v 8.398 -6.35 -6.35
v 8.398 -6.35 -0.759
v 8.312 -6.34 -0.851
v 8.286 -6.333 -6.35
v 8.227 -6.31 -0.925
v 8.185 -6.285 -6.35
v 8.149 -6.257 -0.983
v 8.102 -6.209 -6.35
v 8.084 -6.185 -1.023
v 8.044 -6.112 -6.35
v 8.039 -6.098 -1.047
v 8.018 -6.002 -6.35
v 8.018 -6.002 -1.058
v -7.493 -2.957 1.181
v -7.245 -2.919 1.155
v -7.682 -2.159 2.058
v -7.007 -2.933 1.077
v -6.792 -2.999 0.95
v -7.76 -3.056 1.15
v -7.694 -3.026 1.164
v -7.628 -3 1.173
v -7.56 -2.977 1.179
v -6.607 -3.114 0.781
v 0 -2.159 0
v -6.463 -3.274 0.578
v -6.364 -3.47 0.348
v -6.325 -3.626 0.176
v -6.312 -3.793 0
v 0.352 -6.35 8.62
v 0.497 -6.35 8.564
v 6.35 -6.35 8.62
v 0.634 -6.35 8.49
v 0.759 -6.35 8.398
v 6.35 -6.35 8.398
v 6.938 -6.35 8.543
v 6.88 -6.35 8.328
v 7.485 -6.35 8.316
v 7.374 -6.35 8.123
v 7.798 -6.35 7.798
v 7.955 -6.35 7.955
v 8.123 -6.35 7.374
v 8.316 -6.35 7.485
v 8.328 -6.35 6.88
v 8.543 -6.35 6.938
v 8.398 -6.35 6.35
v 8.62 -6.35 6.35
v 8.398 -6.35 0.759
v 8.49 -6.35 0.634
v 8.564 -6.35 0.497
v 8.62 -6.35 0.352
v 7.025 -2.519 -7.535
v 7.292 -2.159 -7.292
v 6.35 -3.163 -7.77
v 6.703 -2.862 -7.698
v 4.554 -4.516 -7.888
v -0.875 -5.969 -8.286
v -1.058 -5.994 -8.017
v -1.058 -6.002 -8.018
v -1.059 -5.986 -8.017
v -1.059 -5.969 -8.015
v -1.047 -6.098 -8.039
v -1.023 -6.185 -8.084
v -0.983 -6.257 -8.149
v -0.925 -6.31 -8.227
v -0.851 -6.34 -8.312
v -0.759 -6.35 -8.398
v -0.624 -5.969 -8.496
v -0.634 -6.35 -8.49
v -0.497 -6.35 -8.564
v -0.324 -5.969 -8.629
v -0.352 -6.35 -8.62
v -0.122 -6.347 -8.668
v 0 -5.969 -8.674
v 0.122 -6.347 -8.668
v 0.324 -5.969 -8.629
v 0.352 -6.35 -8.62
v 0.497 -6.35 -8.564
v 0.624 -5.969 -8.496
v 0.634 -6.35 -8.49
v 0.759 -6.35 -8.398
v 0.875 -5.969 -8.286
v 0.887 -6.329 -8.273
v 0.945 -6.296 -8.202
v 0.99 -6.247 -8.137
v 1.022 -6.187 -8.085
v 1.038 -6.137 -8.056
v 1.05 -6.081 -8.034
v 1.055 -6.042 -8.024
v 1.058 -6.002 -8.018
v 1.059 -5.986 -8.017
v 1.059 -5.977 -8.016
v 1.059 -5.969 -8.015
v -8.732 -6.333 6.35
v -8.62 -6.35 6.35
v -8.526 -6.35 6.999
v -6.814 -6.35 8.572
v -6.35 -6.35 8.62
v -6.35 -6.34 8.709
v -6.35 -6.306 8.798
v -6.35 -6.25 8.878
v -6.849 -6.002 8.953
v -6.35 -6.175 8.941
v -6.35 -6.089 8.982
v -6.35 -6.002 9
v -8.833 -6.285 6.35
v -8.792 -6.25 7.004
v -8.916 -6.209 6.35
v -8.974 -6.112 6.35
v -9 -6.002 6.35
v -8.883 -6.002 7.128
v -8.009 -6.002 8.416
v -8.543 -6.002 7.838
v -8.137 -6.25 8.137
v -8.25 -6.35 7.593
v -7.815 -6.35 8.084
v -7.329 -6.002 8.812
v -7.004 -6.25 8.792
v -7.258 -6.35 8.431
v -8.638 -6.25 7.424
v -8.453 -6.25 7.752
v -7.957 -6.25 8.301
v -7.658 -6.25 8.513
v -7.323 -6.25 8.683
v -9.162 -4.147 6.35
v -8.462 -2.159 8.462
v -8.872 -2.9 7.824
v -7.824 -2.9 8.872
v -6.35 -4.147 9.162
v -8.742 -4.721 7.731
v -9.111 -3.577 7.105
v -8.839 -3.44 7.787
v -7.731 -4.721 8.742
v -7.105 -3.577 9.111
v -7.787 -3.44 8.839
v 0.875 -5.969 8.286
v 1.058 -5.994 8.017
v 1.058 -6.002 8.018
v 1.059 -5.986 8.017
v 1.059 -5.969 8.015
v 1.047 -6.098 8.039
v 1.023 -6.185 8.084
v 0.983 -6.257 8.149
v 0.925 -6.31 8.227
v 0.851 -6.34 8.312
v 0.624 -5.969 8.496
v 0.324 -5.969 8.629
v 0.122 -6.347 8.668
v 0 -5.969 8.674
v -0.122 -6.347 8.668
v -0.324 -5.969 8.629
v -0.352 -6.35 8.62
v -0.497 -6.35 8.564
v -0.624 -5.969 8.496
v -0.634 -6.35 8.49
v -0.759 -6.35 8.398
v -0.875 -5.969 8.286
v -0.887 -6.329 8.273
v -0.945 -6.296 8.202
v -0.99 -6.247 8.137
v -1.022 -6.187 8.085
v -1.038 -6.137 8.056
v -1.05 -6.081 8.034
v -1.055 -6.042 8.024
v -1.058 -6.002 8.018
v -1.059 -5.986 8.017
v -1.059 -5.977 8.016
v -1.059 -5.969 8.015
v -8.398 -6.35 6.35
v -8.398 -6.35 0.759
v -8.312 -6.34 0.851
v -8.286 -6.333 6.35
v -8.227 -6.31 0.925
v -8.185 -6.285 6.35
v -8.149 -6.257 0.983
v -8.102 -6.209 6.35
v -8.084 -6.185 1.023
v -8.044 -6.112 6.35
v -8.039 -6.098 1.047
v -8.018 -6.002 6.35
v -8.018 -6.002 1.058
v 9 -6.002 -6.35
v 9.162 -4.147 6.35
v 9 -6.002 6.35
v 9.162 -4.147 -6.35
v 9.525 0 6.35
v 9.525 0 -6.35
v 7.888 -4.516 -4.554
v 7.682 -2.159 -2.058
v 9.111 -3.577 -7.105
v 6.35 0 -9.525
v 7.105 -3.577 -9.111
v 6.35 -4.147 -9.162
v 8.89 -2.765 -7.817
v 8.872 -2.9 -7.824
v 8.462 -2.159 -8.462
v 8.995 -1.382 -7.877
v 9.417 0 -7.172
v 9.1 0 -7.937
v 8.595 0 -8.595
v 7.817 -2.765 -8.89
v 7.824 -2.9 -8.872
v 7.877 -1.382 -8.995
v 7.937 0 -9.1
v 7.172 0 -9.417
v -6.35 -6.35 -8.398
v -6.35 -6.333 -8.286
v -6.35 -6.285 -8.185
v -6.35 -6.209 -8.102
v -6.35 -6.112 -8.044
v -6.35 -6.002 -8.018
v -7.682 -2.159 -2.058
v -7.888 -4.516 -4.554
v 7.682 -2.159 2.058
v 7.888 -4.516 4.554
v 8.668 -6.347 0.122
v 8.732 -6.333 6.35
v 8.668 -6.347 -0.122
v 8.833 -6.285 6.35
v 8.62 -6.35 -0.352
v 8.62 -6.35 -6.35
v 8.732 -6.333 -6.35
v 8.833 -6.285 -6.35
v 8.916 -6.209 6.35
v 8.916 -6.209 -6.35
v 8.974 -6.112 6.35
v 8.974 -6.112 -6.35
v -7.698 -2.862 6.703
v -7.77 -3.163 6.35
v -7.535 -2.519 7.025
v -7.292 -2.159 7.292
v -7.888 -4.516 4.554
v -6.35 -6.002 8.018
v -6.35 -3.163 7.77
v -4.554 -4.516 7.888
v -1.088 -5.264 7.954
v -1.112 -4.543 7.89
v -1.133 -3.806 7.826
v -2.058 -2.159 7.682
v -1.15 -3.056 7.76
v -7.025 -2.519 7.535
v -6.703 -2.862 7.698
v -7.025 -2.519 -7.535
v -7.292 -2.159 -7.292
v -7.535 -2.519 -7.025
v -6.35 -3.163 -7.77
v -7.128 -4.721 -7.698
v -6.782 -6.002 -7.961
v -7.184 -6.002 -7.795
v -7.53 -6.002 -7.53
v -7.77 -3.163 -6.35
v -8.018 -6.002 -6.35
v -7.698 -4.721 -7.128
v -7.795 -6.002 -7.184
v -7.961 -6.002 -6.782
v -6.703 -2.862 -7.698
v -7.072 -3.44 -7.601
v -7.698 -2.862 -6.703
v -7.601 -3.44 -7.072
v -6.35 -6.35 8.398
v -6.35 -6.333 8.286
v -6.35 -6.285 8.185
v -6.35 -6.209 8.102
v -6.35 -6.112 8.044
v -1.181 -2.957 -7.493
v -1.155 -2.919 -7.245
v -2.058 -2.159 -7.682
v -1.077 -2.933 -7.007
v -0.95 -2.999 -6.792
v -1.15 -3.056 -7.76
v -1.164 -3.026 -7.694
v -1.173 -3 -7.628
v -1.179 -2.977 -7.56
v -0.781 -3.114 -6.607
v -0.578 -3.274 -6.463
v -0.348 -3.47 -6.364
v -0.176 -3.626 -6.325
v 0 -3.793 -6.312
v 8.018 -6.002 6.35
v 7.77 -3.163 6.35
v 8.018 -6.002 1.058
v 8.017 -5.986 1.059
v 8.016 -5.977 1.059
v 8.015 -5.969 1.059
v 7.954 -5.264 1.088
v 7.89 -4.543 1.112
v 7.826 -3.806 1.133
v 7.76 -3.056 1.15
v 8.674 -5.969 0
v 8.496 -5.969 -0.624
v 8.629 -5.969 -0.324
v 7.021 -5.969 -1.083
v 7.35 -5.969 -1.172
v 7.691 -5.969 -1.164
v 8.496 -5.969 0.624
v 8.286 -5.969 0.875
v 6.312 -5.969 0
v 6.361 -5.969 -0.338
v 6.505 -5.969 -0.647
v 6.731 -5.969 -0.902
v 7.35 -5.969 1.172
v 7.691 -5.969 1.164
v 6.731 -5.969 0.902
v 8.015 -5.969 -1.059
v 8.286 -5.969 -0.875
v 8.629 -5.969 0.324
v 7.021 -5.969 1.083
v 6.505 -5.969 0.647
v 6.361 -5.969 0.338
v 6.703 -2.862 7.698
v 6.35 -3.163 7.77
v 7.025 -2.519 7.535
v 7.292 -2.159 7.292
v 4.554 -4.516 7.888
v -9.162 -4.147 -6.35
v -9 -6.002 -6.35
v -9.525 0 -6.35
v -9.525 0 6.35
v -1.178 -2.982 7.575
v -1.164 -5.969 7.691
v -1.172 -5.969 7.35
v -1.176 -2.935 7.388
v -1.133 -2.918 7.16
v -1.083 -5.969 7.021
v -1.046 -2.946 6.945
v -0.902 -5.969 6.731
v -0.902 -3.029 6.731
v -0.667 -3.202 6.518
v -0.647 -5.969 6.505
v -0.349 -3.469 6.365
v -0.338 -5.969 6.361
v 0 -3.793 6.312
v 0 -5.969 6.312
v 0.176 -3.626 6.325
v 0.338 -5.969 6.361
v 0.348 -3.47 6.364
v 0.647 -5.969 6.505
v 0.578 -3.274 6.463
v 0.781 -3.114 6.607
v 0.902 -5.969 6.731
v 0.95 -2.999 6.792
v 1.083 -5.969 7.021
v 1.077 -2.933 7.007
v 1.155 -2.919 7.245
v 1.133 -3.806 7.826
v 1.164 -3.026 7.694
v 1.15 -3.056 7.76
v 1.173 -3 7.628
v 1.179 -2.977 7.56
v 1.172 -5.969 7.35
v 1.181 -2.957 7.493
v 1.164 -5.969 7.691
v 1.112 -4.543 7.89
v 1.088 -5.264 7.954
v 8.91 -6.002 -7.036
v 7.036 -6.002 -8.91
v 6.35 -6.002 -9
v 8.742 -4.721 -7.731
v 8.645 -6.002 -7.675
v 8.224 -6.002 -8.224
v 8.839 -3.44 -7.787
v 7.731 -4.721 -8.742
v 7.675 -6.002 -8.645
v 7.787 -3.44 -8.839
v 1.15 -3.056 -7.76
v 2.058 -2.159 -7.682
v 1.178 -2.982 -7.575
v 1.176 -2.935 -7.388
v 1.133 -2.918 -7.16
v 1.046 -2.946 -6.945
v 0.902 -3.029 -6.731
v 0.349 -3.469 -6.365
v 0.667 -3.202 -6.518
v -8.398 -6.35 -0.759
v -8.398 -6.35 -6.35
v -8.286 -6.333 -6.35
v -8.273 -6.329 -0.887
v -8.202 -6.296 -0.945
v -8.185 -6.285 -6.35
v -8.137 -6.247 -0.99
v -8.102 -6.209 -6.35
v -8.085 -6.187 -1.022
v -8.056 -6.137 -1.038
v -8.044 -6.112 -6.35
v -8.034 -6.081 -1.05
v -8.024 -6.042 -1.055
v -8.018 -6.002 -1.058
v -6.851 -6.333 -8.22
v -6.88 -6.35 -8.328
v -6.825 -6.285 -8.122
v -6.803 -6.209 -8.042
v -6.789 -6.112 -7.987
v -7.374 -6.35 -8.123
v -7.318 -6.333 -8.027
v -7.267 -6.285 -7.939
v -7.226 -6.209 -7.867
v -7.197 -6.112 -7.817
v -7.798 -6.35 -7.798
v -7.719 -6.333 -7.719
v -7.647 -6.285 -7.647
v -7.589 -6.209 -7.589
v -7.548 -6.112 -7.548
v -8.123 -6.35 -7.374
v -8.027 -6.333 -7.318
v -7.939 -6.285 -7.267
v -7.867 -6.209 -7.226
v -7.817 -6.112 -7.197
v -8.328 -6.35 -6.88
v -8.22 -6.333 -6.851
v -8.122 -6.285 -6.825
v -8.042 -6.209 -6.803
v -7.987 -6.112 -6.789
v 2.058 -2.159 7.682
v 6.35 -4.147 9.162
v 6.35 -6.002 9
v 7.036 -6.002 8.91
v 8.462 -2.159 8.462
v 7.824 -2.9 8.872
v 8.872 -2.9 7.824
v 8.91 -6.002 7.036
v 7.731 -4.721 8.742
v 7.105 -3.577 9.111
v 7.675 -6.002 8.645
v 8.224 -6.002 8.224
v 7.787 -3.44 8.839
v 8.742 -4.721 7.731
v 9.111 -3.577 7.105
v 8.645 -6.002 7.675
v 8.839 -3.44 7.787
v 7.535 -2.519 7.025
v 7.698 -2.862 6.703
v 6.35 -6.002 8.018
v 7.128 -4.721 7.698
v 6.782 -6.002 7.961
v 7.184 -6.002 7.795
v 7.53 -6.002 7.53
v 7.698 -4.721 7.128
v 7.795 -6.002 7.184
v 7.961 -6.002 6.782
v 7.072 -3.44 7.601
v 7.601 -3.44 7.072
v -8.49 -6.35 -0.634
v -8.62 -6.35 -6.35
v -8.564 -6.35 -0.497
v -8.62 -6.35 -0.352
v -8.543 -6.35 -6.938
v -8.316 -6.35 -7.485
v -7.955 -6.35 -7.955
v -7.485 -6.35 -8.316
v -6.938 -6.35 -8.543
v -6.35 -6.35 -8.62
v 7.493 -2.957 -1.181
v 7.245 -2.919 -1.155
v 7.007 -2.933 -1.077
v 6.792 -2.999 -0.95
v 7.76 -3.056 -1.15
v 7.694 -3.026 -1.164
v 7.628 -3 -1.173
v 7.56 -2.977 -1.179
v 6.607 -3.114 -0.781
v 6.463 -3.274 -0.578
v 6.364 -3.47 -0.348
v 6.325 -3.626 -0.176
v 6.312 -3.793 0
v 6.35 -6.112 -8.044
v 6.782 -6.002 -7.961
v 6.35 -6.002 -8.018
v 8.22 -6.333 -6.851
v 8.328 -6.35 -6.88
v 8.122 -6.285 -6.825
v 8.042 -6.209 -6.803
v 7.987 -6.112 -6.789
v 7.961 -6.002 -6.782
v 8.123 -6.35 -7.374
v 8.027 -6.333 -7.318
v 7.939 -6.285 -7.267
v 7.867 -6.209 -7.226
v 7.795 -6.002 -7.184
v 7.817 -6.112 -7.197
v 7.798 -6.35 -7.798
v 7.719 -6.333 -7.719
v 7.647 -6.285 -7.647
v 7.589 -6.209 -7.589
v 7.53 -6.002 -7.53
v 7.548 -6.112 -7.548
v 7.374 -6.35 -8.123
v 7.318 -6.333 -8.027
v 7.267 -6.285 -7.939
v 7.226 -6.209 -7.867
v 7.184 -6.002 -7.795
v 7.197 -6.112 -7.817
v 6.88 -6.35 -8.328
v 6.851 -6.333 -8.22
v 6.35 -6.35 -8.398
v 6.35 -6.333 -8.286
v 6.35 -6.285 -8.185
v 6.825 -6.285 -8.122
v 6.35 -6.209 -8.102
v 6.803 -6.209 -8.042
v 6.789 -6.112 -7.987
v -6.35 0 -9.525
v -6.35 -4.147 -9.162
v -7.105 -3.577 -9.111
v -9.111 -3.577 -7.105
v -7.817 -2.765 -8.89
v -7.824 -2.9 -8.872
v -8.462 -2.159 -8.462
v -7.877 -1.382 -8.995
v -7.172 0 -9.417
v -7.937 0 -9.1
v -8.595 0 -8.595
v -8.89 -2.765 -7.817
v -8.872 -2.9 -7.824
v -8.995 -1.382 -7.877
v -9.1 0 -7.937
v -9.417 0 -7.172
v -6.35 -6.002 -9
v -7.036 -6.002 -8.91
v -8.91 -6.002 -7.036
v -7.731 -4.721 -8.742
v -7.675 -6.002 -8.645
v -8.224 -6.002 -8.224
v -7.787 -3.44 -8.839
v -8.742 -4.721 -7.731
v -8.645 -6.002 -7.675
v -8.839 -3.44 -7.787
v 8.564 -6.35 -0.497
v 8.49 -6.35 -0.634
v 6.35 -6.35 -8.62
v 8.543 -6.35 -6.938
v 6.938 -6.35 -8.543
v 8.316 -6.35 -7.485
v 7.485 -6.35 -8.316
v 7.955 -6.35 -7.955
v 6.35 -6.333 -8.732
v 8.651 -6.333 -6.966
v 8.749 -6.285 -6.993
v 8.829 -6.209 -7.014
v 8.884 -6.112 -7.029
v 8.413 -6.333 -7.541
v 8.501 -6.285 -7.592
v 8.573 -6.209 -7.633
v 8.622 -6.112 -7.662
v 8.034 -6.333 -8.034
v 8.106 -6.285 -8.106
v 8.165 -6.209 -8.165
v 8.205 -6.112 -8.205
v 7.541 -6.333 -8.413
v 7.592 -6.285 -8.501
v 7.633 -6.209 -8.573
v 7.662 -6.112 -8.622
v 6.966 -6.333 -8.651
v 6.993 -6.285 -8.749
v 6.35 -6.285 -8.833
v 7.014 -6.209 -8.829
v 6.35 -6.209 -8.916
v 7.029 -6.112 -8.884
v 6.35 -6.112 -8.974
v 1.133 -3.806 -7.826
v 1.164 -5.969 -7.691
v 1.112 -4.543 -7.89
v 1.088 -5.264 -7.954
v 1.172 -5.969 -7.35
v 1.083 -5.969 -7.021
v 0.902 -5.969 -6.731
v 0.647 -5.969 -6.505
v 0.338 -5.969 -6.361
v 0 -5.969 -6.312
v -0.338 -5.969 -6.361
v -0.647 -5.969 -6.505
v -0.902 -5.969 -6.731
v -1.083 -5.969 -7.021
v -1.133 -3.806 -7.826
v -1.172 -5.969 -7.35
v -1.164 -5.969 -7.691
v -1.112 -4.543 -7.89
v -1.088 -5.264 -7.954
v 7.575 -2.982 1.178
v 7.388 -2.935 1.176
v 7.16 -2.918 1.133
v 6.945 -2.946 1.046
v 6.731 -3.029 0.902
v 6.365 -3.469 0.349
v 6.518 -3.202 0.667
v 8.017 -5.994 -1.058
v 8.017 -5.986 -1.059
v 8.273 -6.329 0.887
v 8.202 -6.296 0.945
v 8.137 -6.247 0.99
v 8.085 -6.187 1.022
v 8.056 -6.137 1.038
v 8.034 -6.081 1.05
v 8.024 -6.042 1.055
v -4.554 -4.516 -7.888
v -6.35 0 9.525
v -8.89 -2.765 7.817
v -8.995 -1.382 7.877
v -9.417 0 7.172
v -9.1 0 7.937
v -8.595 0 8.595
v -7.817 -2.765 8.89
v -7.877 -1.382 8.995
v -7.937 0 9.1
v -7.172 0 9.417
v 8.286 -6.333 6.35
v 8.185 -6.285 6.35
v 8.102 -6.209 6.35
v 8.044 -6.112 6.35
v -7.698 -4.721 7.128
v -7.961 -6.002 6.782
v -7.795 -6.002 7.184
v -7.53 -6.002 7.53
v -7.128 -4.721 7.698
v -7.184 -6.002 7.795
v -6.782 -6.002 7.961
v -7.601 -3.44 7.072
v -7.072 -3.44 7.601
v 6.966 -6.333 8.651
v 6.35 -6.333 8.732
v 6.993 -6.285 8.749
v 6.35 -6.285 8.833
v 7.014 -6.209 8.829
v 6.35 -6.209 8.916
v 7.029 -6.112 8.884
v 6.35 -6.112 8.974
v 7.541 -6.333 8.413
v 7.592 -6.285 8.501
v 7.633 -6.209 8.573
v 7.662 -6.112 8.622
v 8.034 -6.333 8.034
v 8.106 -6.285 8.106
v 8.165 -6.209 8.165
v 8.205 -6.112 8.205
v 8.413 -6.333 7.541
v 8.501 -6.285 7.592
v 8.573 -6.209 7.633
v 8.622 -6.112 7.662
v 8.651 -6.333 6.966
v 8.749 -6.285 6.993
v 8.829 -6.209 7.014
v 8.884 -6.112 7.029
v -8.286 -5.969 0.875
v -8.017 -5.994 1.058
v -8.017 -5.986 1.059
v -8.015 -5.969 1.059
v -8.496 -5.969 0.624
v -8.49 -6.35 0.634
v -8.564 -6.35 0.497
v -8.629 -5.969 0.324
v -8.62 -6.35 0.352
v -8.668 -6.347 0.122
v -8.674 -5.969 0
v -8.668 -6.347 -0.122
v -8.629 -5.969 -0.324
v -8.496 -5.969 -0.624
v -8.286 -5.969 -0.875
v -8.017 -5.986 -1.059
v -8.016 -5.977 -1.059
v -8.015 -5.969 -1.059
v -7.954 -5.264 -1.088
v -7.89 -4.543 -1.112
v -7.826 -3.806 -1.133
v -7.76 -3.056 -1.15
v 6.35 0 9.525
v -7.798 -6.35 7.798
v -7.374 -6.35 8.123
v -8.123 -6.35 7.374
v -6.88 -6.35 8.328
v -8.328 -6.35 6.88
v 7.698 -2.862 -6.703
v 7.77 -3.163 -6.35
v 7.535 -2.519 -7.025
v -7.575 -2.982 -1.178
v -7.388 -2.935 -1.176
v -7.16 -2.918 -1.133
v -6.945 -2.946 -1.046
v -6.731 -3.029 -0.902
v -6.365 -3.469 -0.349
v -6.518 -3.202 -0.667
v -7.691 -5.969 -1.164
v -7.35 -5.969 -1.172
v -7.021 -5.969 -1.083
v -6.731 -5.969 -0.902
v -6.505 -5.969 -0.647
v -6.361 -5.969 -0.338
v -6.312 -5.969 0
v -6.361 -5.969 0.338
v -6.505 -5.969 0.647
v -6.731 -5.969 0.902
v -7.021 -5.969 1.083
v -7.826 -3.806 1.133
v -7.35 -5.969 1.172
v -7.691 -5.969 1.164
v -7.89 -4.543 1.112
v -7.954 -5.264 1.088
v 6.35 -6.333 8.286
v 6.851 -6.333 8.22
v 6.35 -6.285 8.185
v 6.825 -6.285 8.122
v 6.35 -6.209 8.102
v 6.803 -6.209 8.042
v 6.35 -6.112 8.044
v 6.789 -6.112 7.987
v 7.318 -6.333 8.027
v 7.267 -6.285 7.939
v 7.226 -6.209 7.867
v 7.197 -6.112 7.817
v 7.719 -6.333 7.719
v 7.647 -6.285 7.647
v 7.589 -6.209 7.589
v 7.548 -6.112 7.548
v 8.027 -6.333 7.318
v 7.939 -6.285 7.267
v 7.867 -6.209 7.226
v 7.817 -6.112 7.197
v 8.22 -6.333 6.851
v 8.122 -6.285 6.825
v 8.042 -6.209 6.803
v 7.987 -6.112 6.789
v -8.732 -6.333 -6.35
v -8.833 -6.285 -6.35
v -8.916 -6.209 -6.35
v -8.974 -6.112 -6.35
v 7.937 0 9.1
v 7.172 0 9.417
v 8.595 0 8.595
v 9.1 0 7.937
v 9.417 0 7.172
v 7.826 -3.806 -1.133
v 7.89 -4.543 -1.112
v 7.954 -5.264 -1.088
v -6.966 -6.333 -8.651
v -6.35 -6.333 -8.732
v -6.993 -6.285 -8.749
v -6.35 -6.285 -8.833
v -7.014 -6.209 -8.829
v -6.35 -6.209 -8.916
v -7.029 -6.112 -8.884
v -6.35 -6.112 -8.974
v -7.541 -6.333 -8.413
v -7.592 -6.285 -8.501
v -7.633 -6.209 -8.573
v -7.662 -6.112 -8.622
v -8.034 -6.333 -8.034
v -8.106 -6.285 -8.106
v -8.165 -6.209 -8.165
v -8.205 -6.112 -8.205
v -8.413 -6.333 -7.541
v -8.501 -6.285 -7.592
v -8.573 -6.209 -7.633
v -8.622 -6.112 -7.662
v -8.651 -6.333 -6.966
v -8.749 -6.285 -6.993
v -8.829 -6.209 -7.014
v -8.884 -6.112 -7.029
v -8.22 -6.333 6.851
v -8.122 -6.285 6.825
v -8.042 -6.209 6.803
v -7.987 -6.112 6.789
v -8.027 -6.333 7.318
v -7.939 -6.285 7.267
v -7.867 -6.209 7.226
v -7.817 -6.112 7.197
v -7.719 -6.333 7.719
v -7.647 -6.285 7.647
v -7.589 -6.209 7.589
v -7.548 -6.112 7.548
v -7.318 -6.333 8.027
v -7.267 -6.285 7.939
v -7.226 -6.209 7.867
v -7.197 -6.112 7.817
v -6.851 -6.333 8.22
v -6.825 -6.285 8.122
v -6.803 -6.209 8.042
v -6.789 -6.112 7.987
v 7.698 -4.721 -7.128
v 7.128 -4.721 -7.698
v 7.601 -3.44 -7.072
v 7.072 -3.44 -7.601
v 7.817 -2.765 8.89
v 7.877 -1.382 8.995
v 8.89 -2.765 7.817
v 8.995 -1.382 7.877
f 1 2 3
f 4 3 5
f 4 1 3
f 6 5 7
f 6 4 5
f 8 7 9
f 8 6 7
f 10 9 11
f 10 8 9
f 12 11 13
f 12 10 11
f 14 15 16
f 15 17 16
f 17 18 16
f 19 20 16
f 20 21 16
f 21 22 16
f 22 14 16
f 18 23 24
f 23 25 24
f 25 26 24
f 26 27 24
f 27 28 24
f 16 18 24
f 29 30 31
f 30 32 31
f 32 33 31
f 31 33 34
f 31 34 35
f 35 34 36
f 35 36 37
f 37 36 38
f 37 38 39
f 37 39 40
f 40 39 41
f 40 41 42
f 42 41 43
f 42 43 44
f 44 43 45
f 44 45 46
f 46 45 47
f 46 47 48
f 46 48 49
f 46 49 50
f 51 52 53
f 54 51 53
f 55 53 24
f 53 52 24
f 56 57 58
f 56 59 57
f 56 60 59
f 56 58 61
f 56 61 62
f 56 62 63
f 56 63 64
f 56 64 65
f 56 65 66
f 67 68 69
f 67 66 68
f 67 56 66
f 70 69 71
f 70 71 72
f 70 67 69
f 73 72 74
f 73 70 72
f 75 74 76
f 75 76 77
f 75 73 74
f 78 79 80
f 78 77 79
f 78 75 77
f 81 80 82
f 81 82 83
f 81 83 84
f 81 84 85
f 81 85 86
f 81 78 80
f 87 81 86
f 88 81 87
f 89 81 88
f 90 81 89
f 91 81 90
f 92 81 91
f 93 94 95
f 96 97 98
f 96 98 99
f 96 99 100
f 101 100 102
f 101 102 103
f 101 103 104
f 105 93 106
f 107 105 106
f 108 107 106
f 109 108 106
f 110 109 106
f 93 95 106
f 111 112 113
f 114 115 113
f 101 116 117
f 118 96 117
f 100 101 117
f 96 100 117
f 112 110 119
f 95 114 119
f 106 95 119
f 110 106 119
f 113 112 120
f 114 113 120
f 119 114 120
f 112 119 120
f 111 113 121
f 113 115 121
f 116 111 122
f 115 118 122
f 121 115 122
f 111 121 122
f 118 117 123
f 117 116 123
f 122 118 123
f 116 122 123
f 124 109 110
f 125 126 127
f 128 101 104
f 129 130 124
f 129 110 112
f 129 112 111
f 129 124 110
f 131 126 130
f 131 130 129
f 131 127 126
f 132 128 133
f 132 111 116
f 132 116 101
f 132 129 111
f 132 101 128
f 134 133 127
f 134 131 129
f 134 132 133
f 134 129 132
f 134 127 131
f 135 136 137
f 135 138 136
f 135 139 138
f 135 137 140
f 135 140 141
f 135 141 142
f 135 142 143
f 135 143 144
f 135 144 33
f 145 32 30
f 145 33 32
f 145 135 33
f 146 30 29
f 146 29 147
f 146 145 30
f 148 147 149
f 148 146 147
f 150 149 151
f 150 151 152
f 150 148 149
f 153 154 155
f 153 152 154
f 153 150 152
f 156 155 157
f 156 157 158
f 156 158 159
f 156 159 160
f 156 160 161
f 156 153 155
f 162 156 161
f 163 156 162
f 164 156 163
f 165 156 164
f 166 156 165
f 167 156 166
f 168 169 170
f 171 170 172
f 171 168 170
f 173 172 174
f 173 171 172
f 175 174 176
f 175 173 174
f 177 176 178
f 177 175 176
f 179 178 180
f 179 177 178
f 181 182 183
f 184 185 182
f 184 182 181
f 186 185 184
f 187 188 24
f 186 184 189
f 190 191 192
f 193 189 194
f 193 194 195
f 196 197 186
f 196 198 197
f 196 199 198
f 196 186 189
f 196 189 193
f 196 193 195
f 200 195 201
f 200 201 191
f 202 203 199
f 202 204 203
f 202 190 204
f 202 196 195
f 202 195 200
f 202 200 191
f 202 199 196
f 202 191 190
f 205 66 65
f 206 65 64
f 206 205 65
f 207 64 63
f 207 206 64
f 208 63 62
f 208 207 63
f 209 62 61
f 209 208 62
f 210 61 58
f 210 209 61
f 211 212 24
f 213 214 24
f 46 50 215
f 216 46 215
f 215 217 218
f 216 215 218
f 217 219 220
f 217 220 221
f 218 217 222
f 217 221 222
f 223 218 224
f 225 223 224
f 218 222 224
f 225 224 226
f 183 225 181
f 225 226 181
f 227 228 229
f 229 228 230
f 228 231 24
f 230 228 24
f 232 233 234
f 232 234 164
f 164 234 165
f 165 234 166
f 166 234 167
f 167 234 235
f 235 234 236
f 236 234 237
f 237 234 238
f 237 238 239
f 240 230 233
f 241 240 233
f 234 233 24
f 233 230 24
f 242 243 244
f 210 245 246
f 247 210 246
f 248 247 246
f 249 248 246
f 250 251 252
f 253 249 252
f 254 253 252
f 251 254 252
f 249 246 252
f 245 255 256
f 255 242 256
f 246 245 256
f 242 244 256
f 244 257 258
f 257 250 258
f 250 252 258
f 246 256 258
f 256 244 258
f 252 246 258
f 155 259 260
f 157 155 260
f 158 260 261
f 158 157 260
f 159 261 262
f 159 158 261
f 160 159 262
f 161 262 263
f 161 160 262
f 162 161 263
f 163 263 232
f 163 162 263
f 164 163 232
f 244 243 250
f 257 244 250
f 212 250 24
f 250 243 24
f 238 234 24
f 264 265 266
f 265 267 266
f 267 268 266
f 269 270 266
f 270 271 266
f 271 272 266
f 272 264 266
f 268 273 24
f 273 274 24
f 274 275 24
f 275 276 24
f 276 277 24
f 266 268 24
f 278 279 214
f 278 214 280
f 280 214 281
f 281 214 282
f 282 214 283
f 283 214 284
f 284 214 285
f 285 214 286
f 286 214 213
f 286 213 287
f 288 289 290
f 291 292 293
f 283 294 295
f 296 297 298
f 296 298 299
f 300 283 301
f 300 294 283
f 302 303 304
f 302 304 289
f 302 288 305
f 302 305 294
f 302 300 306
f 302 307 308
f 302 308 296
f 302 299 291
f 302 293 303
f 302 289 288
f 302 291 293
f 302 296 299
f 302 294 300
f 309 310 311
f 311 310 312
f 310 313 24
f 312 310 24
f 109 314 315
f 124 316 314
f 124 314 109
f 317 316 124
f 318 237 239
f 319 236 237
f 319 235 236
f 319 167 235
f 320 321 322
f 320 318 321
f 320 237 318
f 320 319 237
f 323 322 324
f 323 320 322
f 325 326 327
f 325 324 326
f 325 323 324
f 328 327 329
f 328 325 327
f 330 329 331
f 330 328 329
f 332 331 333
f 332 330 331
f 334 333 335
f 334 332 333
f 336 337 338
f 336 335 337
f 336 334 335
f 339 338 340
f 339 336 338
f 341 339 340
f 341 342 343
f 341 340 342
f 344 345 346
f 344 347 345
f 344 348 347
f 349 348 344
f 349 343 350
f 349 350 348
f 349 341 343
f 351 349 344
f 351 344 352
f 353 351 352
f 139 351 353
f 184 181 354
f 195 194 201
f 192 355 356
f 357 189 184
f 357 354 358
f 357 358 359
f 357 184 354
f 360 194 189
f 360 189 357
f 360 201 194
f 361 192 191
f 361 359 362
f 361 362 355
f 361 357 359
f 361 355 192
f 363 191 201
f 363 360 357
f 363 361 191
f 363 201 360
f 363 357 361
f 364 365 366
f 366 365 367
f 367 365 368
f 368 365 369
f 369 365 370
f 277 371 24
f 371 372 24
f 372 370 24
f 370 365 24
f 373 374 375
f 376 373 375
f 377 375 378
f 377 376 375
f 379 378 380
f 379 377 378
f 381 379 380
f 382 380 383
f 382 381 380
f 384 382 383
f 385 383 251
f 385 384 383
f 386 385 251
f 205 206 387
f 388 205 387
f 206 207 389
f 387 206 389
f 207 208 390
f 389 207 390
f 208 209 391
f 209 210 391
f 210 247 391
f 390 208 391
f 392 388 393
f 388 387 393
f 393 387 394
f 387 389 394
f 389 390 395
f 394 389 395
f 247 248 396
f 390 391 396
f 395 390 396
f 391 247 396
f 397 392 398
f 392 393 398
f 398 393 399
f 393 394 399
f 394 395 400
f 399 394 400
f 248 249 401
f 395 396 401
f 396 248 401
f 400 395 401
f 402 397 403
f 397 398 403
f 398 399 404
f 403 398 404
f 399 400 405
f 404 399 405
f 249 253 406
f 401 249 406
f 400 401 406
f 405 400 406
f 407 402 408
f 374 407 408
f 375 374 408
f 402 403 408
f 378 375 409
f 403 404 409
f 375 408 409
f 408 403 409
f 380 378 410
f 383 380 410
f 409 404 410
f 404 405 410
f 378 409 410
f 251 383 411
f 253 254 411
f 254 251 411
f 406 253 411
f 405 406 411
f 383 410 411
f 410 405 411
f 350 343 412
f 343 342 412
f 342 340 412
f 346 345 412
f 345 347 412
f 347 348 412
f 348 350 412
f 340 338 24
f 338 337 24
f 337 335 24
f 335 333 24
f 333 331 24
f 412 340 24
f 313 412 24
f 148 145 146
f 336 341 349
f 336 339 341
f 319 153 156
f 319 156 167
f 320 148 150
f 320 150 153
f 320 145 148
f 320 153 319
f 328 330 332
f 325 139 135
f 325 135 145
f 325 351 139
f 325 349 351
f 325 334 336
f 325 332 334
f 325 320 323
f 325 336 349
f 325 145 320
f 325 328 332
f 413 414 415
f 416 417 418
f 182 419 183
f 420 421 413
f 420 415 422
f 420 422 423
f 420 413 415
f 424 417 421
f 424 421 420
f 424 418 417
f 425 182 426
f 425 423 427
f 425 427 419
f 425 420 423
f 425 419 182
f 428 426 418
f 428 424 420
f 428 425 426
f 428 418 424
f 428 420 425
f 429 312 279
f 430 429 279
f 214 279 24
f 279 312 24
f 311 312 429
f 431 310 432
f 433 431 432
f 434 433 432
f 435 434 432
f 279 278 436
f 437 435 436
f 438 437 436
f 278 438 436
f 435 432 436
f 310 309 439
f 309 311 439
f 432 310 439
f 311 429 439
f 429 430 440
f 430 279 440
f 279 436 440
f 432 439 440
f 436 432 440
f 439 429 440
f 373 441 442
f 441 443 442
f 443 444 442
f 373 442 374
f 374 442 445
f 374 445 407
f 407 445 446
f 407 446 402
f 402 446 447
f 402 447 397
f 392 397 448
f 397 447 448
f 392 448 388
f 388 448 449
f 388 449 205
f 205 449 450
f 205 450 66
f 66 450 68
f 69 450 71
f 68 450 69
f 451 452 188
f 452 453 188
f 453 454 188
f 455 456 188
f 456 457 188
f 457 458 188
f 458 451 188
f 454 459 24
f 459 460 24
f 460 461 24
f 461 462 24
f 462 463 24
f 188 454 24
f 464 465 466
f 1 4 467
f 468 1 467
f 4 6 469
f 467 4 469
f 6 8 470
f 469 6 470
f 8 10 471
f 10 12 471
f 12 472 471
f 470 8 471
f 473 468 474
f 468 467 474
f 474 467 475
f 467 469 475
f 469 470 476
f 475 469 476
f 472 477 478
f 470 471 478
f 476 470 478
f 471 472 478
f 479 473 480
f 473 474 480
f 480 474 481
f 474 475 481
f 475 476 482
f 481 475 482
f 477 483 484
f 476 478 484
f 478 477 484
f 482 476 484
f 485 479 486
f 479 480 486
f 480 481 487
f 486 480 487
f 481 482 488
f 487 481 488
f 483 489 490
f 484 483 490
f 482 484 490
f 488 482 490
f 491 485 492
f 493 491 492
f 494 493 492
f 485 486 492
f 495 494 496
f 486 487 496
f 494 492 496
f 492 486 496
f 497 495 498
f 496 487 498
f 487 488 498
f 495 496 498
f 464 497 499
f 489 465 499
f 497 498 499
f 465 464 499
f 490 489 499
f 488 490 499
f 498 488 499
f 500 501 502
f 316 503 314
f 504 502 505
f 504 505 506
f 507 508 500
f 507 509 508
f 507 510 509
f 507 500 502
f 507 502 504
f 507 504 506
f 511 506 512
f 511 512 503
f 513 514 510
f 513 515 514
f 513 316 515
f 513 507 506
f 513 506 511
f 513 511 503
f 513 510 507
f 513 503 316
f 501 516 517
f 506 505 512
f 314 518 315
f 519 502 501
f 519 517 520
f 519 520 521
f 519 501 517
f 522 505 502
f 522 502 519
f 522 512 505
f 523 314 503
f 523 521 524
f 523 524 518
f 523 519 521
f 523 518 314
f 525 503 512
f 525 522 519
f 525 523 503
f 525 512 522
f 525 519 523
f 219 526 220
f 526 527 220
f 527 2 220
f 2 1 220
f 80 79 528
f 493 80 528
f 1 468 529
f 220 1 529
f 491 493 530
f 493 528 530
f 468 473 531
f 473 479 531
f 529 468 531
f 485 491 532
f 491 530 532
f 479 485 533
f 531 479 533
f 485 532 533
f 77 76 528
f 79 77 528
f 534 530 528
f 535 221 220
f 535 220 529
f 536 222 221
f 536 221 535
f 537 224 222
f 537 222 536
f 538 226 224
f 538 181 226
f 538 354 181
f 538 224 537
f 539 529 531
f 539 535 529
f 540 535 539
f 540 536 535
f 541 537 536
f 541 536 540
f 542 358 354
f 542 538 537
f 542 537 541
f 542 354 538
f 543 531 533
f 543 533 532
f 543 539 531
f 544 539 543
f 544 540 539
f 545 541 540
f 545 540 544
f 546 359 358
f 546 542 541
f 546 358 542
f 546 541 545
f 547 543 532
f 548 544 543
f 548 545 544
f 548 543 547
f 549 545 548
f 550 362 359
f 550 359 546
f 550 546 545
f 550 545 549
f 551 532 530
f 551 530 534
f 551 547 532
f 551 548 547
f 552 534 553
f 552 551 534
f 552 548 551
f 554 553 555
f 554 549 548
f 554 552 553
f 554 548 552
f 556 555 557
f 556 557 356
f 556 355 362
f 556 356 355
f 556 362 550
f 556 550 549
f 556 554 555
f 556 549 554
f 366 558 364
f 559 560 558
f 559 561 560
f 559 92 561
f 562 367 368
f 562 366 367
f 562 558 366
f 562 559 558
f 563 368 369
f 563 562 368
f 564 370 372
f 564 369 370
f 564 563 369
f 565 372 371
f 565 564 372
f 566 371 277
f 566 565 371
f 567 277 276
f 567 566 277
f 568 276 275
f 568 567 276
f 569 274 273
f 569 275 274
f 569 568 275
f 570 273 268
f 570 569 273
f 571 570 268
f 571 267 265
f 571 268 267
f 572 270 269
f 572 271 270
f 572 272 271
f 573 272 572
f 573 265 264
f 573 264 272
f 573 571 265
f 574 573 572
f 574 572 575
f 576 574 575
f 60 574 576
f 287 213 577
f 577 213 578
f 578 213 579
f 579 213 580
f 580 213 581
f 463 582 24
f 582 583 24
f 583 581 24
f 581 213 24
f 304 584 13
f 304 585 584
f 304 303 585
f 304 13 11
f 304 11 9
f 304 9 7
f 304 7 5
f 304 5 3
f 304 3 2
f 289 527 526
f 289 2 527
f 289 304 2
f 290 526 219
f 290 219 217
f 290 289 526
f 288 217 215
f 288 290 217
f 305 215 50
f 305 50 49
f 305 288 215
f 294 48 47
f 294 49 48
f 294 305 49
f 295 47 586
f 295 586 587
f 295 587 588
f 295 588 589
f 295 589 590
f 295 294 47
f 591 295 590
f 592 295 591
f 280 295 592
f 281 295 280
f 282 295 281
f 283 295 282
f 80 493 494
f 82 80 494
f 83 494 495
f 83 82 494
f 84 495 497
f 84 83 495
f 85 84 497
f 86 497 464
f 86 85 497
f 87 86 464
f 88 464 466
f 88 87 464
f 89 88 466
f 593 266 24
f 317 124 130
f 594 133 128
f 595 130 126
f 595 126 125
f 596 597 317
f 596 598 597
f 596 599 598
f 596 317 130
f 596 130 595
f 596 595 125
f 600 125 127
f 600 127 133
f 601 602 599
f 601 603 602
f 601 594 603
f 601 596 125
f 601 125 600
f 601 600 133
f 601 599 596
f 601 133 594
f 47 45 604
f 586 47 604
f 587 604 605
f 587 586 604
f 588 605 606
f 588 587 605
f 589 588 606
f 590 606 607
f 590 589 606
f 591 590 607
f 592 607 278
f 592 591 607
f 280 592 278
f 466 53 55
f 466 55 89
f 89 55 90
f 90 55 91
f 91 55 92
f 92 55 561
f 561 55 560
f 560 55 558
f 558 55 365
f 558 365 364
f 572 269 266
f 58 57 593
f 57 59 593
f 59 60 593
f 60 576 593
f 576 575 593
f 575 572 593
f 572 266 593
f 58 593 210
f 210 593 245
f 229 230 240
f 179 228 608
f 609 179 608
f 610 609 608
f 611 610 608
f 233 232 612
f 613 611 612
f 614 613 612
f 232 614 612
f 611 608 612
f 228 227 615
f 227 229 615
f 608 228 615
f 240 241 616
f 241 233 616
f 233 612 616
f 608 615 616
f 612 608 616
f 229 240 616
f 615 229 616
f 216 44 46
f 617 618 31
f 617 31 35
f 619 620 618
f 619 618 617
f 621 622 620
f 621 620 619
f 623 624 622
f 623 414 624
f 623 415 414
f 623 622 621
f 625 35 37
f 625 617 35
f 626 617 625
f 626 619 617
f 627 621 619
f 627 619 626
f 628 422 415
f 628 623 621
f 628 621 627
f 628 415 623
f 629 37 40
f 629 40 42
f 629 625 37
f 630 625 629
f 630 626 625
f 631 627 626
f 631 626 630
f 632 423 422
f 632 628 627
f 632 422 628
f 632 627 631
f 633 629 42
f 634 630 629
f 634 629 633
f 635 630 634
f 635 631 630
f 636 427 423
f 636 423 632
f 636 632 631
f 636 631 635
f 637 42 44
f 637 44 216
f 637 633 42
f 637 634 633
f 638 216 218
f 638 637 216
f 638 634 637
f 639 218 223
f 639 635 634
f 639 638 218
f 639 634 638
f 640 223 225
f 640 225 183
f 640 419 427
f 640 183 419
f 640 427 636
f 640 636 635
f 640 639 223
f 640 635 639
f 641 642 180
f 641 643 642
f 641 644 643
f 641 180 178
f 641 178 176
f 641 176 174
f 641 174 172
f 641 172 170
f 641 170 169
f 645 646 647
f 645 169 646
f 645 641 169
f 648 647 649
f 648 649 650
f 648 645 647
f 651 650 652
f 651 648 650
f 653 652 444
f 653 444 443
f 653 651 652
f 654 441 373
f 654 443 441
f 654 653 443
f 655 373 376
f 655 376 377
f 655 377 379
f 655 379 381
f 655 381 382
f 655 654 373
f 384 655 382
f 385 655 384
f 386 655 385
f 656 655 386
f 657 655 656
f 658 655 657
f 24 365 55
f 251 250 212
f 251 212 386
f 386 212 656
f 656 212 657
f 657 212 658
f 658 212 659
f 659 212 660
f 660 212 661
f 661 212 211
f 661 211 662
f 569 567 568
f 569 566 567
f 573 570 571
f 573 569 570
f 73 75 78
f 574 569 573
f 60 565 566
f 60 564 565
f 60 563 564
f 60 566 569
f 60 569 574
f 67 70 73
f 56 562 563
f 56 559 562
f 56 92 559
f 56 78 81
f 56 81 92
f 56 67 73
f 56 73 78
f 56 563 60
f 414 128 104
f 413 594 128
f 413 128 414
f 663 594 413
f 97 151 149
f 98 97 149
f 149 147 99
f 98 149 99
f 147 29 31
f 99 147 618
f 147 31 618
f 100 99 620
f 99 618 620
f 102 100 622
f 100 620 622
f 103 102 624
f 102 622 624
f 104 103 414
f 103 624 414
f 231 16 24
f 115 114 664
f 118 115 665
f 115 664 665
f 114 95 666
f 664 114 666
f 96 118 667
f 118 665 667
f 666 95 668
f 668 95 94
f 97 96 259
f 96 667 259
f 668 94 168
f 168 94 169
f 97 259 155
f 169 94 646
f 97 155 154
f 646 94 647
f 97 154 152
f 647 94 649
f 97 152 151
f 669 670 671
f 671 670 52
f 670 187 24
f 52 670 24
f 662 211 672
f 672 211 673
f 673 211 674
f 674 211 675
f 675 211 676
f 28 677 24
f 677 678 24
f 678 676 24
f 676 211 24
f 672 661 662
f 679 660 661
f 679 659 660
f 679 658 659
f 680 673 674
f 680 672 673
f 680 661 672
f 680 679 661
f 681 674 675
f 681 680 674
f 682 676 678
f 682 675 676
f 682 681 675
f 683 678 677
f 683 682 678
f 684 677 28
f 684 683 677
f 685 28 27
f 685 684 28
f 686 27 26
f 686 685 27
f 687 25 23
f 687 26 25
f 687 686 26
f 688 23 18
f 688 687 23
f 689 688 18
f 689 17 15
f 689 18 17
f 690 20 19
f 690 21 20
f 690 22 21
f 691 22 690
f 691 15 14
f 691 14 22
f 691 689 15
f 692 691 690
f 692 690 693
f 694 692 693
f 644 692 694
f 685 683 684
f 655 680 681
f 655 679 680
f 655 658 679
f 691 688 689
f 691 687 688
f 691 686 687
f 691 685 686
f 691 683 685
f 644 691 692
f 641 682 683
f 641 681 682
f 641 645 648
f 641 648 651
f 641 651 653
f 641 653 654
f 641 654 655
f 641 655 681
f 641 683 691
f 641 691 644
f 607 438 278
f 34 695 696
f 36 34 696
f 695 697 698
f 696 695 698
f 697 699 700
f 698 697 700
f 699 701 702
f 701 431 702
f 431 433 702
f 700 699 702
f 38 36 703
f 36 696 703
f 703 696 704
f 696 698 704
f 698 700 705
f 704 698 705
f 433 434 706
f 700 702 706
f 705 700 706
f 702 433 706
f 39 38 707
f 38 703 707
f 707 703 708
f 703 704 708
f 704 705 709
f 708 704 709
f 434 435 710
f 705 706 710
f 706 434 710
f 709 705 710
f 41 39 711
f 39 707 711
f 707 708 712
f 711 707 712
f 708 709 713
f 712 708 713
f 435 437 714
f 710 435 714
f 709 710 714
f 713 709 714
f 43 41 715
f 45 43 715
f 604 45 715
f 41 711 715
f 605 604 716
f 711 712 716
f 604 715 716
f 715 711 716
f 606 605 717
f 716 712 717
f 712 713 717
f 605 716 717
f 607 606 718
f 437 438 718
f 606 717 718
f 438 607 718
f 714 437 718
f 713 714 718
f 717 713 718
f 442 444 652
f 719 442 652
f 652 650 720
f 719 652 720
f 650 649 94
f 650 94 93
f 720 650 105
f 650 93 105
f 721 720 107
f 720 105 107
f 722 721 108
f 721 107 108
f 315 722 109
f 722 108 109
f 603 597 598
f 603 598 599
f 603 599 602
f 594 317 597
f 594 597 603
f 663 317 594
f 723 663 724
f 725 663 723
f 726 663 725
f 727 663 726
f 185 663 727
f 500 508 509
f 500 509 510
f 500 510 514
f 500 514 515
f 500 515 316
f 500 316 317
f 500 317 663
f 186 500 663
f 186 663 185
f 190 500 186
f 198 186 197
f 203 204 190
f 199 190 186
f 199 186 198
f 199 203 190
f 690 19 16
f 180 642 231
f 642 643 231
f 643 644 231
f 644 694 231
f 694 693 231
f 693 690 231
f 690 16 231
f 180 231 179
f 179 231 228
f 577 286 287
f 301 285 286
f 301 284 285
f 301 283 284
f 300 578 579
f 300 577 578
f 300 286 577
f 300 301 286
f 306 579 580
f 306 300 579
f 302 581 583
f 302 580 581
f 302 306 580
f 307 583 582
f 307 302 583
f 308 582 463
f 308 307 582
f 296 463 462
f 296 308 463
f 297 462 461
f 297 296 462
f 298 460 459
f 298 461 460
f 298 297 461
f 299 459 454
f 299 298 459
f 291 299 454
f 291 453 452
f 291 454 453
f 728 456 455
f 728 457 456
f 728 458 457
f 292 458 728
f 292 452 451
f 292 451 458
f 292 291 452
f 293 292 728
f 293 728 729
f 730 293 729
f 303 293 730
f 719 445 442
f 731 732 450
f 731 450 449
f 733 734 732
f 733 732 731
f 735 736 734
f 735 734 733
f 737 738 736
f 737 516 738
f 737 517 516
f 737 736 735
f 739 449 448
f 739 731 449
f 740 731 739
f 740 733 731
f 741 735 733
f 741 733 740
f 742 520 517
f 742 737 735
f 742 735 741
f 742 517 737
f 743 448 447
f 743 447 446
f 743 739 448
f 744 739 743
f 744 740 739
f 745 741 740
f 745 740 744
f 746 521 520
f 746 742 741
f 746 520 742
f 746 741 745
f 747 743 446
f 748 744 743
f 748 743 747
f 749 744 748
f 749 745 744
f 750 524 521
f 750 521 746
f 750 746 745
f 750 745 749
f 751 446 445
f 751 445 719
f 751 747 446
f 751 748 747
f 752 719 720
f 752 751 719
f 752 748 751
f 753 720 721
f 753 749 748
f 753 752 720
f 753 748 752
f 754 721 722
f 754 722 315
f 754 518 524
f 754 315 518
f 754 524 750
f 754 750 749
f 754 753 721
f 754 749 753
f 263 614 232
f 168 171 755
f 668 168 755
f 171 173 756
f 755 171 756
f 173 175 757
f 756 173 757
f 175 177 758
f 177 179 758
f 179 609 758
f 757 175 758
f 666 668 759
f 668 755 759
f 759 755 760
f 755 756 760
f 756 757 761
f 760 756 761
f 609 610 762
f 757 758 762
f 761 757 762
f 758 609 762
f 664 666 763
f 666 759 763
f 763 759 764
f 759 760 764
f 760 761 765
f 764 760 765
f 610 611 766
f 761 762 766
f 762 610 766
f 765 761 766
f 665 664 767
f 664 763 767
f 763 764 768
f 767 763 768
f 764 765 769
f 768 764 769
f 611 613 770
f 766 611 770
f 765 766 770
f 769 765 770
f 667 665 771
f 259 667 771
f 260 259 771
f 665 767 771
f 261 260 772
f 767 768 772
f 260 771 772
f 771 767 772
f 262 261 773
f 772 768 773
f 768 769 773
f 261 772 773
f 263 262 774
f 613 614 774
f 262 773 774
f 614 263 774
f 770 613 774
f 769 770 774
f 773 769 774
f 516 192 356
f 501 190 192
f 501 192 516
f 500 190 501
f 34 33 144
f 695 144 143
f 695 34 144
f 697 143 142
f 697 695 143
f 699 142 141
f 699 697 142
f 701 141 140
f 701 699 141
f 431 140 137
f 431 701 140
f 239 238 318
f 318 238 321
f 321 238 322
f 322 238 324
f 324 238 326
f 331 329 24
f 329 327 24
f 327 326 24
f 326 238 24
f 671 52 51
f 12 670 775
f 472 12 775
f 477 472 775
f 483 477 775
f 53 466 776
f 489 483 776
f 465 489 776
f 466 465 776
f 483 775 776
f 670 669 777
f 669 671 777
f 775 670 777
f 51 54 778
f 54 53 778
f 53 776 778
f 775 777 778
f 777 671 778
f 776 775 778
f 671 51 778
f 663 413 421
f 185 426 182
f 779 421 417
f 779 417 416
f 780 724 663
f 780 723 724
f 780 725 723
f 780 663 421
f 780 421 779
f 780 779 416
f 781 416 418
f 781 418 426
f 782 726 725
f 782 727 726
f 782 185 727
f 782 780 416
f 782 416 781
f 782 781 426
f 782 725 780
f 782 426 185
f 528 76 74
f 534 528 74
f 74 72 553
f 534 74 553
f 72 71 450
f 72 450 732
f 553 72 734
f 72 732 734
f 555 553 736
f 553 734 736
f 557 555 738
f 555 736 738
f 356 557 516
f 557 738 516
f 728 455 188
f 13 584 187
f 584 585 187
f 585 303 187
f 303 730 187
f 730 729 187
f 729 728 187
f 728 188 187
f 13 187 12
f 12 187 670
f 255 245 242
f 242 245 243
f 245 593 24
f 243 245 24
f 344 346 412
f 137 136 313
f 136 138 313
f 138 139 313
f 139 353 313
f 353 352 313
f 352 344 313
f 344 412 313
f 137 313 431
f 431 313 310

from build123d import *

# Parameters (mm, degrees)
BOSS_EXTRUDE1_DEPTH = 6.35
BOSS_EXTRUDE1_DRAFT = -5
CUT_EXTRUDE3_DEPTH  = 15.892070037
CIRPATTERN3_COUNT   = 12
BOSS_EXTRUDE3_DEPTH = 6.35
BOSS_EXTRUDE3_DRAFT = -5
FILLET2_R           = 0.381
BOSS_EXTRUDE4_REACH = 16.734
SKETCH8_R           = 1.1811
SKETCH9_R           = 1.1811
CUT_EXTRUDE4_DEPTH  = 15.73364215
CIRPATTERN4_COUNT   = 4


with BuildPart() as part:
    # Sketch1 → Boss-Extrude1 (with draft: the straight prism first)
    with BuildSketch(Plane(origin=(0, 0, 0), x_dir=(1, 0, 0), z_dir=(0, 1, 0))):
        with BuildLine():
            Line((-6.35, -9.525), (6.35, -9.525))
            ThreePointArc((6.35, -9.525), (8.59506403, -8.59506403), (9.525, -6.35))
            Line((9.525, -6.35), (9.525, 6.35))
            ThreePointArc((9.525, 6.35), (8.59506403, 8.59506403), (6.35, 9.525))
            Line((6.35, 9.525), (-6.35, 9.525))
            ThreePointArc((-6.35, 9.525), (-8.59506403, 8.59506403), (-9.525, 6.35))
            Line((-9.525, 6.35), (-9.525, -6.35))
            ThreePointArc((-9.525, -6.35), (-8.59506403, -8.59506403), (-6.35, -9.525))
        make_face()
    extrude(amount=-BOSS_EXTRUDE1_DEPTH)
    # Boss-Extrude1: the draft: its side faces are tilted about the plane it starts from
    boss_extrude1_sides = [part.faces().sort_by_distance(p)[0] for p in [
        (-8.59506403, -3.175, 8.59506403),
        (0, -3.175, 9.525),
        (8.59506403, -3.175, 8.59506403),
        (9.525, -3.175, 0),
        (8.59506403, -3.175, -8.59506403),
        (0, -3.175, -9.525),
        (-8.59506403, -3.175, -8.59506403),
        (-9.525, -3.175, 0),
    ]]
    draft(boss_extrude1_sides, Plane(origin=(0, 0, 0), x_dir=(1, 0, 0), z_dir=(0, 1, 0)), BOSS_EXTRUDE1_DRAFT)

    # Sketch6 → Cut-Extrude3 (cut, through all)
    with BuildSketch(Plane(origin=(0, 0, 0), x_dir=(0.9659258262890681, 0, 0.25881904510252135), z_dir=(-0.25881904510252135, 0, 0.9659258262890681))):
        Polygon((0, -2.159), (-7.366, -9.525), (7.366, -9.525), align=None)
    cut_extrude3 = extrude(amount=-CUT_EXTRUDE3_DEPTH, mode=Mode.SUBTRACT)

    # CirPattern3: Cut-Extrude3 ×12 about axis
    cirpattern3_axis = Axis((0, 0, 0), (0, 1, 0))
    for i in range(1, CIRPATTERN3_COUNT):
        add(cut_extrude3.rotate(cirpattern3_axis, i * 360 / CIRPATTERN3_COUNT), mode=Mode.SUBTRACT)


with BuildPart() as boss_extrude3_tool:
    # Sketch7 → Boss-Extrude3 (with draft: the straight prism first)
    with BuildSketch(Plane(origin=(0, 0, 0), x_dir=(1, 0, 0), z_dir=(0, 1, 0))):
        with BuildLine():
            Line((-6.35, -9.525), (6.35, -9.525))
            ThreePointArc((6.35, -9.525), (8.59506403, -8.59506403), (9.525, -6.35))
            Line((9.525, -6.35), (9.525, 6.35))
            ThreePointArc((9.525, 6.35), (8.59506403, 8.59506403), (6.35, 9.525))
            Line((6.35, 9.525), (-6.35, 9.525))
            ThreePointArc((-6.35, 9.525), (-8.59506403, 8.59506403), (-9.525, 6.35))
            Line((-9.525, 6.35), (-9.525, -6.35))
            ThreePointArc((-9.525, -6.35), (-8.59506403, -8.59506403), (-6.35, -9.525))
        make_face()
        with BuildLine():
            Line((-6.35, -7.493), (6.35, -7.493))
            ThreePointArc((6.35, -7.493), (7.158223051, -7.158223051), (7.493, -6.35))
            Line((7.493, -6.35), (7.493, 6.35))
            ThreePointArc((7.493, 6.35), (7.158223051, 7.158223051), (6.35, 7.493))
            Line((6.35, 7.493), (-6.35, 7.493))
            ThreePointArc((-6.35, 7.493), (-7.158223051, 7.158223051), (-7.493, 6.35))
            Line((-7.493, 6.35), (-7.493, -6.35))
            ThreePointArc((-7.493, -6.35), (-7.158223051, -7.158223051), (-6.35, -7.493))
        make_face(mode=Mode.SUBTRACT)
    extrude(amount=-BOSS_EXTRUDE3_DEPTH)
    # Boss-Extrude3: the draft: its side faces are tilted about the plane it starts from
    boss_extrude3_sides = [boss_extrude3_tool.faces().sort_by_distance(p)[0] for p in [
        (0, -3.175, 9.525),
        (8.59506403, -3.175, 8.59506403),
        (9.525, -3.175, 0),
        (8.59506403, -3.175, -8.59506403),
        (0, -3.175, -9.525),
        (-8.59506403, -3.175, -8.59506403),
        (-9.525, -3.175, 0),
        (-8.59506403, -3.175, 8.59506403),
        (-7.158223051, -3.175, 7.158223051),
        (-7.493, -3.175, 0),
        (-7.158223051, -3.175, -7.158223051),
        (0, -3.175, -7.493),
        (7.158223051, -3.175, -7.158223051),
        (7.493, -3.175, 0),
        (7.158223051, -3.175, 7.158223051),
        (0, -3.175, 7.493),
    ]]
    draft(boss_extrude3_sides, Plane(origin=(0, 0, 0), x_dir=(1, 0, 0), z_dir=(0, 1, 0)), BOSS_EXTRUDE3_DRAFT)


with BuildPart() as part_1:
    add(part.part)

    # Boss-Extrude3: add boss_extrude3_tool
    add(boss_extrude3_tool.part)

    # Fillet2
    fillet2_edges = [part_1.edges().sort_by_distance(p)[0] for p in [
        (8.202228727, -6.35, -8.202228727),
        (8.202228727, -6.35, 8.202228727),
        (-8.202228727, -6.35, 8.202228727),
        (-8.202228727, -6.35, -8.202228727),
        (-8.969446987, -6.35, 0),
        (0, -6.35, -8.969446987),
        (0, -6.35, 8.969446987),
        (8.969446987, -6.35, 0),
        (-8.048553013, -6.35, 0),
        (-7.551058354, -6.35, 7.551058354),
        (0, -6.35, 8.048553013),
        (7.551058354, -6.35, 7.551058354),
        (8.048553013, -6.35, 0),
        (7.551058354, -6.35, -7.551058354),
        (0, -6.35, -8.048553013),
        (-7.551058354, -6.35, -7.551058354),
    ]]
    fillet(fillet2_edges, radius=FILLET2_R)

    # Sketch8 → Boss-Extrude4 (add, up to next)
    with BuildSketch(Plane(origin=(0, -5.969, 0), x_dir=(-1, 0, 0), z_dir=(0, -1, 0)), mode=Mode.PRIVATE) as boss_extrude4_sk1:
        with Locations((0, 7.493)):
            Circle(SKETCH8_R)
    boss_extrude4_tool1 = extrude(boss_extrude4_sk1.sketch, amount=-BOSS_EXTRUDE4_REACH, mode=Mode.PRIVATE) - part_1.part
    boss_extrude4 = boss_extrude4_tool1.solids().sort_by_distance((0, -5.969, -7.493))[0]
    add(boss_extrude4)

    # Sketch9 → Cut-Extrude4 (cut, through all)
    with BuildSketch(Plane.XZ.offset(5.969)):
        with Locations((0, -7.493)):
            Circle(SKETCH9_R)
    cut_extrude4 = extrude(amount=CUT_EXTRUDE4_DEPTH, mode=Mode.SUBTRACT)

    # CirPattern4: Boss-Extrude4, Cut-Extrude4 ×4 about axis
    cirpattern4_axis = Axis((0, 0, 0), (0, 1, 0))
    add([boss_extrude4.rotate(cirpattern4_axis, i * 360 / CIRPATTERN4_COUNT) for i in range(1, CIRPATTERN4_COUNT)])
    add([cut_extrude4.rotate(cirpattern4_axis, i * 360 / CIRPATTERN4_COUNT) for i in range(1, CIRPATTERN4_COUNT)], mode=Mode.SUBTRACT)


solid = part_1.part
